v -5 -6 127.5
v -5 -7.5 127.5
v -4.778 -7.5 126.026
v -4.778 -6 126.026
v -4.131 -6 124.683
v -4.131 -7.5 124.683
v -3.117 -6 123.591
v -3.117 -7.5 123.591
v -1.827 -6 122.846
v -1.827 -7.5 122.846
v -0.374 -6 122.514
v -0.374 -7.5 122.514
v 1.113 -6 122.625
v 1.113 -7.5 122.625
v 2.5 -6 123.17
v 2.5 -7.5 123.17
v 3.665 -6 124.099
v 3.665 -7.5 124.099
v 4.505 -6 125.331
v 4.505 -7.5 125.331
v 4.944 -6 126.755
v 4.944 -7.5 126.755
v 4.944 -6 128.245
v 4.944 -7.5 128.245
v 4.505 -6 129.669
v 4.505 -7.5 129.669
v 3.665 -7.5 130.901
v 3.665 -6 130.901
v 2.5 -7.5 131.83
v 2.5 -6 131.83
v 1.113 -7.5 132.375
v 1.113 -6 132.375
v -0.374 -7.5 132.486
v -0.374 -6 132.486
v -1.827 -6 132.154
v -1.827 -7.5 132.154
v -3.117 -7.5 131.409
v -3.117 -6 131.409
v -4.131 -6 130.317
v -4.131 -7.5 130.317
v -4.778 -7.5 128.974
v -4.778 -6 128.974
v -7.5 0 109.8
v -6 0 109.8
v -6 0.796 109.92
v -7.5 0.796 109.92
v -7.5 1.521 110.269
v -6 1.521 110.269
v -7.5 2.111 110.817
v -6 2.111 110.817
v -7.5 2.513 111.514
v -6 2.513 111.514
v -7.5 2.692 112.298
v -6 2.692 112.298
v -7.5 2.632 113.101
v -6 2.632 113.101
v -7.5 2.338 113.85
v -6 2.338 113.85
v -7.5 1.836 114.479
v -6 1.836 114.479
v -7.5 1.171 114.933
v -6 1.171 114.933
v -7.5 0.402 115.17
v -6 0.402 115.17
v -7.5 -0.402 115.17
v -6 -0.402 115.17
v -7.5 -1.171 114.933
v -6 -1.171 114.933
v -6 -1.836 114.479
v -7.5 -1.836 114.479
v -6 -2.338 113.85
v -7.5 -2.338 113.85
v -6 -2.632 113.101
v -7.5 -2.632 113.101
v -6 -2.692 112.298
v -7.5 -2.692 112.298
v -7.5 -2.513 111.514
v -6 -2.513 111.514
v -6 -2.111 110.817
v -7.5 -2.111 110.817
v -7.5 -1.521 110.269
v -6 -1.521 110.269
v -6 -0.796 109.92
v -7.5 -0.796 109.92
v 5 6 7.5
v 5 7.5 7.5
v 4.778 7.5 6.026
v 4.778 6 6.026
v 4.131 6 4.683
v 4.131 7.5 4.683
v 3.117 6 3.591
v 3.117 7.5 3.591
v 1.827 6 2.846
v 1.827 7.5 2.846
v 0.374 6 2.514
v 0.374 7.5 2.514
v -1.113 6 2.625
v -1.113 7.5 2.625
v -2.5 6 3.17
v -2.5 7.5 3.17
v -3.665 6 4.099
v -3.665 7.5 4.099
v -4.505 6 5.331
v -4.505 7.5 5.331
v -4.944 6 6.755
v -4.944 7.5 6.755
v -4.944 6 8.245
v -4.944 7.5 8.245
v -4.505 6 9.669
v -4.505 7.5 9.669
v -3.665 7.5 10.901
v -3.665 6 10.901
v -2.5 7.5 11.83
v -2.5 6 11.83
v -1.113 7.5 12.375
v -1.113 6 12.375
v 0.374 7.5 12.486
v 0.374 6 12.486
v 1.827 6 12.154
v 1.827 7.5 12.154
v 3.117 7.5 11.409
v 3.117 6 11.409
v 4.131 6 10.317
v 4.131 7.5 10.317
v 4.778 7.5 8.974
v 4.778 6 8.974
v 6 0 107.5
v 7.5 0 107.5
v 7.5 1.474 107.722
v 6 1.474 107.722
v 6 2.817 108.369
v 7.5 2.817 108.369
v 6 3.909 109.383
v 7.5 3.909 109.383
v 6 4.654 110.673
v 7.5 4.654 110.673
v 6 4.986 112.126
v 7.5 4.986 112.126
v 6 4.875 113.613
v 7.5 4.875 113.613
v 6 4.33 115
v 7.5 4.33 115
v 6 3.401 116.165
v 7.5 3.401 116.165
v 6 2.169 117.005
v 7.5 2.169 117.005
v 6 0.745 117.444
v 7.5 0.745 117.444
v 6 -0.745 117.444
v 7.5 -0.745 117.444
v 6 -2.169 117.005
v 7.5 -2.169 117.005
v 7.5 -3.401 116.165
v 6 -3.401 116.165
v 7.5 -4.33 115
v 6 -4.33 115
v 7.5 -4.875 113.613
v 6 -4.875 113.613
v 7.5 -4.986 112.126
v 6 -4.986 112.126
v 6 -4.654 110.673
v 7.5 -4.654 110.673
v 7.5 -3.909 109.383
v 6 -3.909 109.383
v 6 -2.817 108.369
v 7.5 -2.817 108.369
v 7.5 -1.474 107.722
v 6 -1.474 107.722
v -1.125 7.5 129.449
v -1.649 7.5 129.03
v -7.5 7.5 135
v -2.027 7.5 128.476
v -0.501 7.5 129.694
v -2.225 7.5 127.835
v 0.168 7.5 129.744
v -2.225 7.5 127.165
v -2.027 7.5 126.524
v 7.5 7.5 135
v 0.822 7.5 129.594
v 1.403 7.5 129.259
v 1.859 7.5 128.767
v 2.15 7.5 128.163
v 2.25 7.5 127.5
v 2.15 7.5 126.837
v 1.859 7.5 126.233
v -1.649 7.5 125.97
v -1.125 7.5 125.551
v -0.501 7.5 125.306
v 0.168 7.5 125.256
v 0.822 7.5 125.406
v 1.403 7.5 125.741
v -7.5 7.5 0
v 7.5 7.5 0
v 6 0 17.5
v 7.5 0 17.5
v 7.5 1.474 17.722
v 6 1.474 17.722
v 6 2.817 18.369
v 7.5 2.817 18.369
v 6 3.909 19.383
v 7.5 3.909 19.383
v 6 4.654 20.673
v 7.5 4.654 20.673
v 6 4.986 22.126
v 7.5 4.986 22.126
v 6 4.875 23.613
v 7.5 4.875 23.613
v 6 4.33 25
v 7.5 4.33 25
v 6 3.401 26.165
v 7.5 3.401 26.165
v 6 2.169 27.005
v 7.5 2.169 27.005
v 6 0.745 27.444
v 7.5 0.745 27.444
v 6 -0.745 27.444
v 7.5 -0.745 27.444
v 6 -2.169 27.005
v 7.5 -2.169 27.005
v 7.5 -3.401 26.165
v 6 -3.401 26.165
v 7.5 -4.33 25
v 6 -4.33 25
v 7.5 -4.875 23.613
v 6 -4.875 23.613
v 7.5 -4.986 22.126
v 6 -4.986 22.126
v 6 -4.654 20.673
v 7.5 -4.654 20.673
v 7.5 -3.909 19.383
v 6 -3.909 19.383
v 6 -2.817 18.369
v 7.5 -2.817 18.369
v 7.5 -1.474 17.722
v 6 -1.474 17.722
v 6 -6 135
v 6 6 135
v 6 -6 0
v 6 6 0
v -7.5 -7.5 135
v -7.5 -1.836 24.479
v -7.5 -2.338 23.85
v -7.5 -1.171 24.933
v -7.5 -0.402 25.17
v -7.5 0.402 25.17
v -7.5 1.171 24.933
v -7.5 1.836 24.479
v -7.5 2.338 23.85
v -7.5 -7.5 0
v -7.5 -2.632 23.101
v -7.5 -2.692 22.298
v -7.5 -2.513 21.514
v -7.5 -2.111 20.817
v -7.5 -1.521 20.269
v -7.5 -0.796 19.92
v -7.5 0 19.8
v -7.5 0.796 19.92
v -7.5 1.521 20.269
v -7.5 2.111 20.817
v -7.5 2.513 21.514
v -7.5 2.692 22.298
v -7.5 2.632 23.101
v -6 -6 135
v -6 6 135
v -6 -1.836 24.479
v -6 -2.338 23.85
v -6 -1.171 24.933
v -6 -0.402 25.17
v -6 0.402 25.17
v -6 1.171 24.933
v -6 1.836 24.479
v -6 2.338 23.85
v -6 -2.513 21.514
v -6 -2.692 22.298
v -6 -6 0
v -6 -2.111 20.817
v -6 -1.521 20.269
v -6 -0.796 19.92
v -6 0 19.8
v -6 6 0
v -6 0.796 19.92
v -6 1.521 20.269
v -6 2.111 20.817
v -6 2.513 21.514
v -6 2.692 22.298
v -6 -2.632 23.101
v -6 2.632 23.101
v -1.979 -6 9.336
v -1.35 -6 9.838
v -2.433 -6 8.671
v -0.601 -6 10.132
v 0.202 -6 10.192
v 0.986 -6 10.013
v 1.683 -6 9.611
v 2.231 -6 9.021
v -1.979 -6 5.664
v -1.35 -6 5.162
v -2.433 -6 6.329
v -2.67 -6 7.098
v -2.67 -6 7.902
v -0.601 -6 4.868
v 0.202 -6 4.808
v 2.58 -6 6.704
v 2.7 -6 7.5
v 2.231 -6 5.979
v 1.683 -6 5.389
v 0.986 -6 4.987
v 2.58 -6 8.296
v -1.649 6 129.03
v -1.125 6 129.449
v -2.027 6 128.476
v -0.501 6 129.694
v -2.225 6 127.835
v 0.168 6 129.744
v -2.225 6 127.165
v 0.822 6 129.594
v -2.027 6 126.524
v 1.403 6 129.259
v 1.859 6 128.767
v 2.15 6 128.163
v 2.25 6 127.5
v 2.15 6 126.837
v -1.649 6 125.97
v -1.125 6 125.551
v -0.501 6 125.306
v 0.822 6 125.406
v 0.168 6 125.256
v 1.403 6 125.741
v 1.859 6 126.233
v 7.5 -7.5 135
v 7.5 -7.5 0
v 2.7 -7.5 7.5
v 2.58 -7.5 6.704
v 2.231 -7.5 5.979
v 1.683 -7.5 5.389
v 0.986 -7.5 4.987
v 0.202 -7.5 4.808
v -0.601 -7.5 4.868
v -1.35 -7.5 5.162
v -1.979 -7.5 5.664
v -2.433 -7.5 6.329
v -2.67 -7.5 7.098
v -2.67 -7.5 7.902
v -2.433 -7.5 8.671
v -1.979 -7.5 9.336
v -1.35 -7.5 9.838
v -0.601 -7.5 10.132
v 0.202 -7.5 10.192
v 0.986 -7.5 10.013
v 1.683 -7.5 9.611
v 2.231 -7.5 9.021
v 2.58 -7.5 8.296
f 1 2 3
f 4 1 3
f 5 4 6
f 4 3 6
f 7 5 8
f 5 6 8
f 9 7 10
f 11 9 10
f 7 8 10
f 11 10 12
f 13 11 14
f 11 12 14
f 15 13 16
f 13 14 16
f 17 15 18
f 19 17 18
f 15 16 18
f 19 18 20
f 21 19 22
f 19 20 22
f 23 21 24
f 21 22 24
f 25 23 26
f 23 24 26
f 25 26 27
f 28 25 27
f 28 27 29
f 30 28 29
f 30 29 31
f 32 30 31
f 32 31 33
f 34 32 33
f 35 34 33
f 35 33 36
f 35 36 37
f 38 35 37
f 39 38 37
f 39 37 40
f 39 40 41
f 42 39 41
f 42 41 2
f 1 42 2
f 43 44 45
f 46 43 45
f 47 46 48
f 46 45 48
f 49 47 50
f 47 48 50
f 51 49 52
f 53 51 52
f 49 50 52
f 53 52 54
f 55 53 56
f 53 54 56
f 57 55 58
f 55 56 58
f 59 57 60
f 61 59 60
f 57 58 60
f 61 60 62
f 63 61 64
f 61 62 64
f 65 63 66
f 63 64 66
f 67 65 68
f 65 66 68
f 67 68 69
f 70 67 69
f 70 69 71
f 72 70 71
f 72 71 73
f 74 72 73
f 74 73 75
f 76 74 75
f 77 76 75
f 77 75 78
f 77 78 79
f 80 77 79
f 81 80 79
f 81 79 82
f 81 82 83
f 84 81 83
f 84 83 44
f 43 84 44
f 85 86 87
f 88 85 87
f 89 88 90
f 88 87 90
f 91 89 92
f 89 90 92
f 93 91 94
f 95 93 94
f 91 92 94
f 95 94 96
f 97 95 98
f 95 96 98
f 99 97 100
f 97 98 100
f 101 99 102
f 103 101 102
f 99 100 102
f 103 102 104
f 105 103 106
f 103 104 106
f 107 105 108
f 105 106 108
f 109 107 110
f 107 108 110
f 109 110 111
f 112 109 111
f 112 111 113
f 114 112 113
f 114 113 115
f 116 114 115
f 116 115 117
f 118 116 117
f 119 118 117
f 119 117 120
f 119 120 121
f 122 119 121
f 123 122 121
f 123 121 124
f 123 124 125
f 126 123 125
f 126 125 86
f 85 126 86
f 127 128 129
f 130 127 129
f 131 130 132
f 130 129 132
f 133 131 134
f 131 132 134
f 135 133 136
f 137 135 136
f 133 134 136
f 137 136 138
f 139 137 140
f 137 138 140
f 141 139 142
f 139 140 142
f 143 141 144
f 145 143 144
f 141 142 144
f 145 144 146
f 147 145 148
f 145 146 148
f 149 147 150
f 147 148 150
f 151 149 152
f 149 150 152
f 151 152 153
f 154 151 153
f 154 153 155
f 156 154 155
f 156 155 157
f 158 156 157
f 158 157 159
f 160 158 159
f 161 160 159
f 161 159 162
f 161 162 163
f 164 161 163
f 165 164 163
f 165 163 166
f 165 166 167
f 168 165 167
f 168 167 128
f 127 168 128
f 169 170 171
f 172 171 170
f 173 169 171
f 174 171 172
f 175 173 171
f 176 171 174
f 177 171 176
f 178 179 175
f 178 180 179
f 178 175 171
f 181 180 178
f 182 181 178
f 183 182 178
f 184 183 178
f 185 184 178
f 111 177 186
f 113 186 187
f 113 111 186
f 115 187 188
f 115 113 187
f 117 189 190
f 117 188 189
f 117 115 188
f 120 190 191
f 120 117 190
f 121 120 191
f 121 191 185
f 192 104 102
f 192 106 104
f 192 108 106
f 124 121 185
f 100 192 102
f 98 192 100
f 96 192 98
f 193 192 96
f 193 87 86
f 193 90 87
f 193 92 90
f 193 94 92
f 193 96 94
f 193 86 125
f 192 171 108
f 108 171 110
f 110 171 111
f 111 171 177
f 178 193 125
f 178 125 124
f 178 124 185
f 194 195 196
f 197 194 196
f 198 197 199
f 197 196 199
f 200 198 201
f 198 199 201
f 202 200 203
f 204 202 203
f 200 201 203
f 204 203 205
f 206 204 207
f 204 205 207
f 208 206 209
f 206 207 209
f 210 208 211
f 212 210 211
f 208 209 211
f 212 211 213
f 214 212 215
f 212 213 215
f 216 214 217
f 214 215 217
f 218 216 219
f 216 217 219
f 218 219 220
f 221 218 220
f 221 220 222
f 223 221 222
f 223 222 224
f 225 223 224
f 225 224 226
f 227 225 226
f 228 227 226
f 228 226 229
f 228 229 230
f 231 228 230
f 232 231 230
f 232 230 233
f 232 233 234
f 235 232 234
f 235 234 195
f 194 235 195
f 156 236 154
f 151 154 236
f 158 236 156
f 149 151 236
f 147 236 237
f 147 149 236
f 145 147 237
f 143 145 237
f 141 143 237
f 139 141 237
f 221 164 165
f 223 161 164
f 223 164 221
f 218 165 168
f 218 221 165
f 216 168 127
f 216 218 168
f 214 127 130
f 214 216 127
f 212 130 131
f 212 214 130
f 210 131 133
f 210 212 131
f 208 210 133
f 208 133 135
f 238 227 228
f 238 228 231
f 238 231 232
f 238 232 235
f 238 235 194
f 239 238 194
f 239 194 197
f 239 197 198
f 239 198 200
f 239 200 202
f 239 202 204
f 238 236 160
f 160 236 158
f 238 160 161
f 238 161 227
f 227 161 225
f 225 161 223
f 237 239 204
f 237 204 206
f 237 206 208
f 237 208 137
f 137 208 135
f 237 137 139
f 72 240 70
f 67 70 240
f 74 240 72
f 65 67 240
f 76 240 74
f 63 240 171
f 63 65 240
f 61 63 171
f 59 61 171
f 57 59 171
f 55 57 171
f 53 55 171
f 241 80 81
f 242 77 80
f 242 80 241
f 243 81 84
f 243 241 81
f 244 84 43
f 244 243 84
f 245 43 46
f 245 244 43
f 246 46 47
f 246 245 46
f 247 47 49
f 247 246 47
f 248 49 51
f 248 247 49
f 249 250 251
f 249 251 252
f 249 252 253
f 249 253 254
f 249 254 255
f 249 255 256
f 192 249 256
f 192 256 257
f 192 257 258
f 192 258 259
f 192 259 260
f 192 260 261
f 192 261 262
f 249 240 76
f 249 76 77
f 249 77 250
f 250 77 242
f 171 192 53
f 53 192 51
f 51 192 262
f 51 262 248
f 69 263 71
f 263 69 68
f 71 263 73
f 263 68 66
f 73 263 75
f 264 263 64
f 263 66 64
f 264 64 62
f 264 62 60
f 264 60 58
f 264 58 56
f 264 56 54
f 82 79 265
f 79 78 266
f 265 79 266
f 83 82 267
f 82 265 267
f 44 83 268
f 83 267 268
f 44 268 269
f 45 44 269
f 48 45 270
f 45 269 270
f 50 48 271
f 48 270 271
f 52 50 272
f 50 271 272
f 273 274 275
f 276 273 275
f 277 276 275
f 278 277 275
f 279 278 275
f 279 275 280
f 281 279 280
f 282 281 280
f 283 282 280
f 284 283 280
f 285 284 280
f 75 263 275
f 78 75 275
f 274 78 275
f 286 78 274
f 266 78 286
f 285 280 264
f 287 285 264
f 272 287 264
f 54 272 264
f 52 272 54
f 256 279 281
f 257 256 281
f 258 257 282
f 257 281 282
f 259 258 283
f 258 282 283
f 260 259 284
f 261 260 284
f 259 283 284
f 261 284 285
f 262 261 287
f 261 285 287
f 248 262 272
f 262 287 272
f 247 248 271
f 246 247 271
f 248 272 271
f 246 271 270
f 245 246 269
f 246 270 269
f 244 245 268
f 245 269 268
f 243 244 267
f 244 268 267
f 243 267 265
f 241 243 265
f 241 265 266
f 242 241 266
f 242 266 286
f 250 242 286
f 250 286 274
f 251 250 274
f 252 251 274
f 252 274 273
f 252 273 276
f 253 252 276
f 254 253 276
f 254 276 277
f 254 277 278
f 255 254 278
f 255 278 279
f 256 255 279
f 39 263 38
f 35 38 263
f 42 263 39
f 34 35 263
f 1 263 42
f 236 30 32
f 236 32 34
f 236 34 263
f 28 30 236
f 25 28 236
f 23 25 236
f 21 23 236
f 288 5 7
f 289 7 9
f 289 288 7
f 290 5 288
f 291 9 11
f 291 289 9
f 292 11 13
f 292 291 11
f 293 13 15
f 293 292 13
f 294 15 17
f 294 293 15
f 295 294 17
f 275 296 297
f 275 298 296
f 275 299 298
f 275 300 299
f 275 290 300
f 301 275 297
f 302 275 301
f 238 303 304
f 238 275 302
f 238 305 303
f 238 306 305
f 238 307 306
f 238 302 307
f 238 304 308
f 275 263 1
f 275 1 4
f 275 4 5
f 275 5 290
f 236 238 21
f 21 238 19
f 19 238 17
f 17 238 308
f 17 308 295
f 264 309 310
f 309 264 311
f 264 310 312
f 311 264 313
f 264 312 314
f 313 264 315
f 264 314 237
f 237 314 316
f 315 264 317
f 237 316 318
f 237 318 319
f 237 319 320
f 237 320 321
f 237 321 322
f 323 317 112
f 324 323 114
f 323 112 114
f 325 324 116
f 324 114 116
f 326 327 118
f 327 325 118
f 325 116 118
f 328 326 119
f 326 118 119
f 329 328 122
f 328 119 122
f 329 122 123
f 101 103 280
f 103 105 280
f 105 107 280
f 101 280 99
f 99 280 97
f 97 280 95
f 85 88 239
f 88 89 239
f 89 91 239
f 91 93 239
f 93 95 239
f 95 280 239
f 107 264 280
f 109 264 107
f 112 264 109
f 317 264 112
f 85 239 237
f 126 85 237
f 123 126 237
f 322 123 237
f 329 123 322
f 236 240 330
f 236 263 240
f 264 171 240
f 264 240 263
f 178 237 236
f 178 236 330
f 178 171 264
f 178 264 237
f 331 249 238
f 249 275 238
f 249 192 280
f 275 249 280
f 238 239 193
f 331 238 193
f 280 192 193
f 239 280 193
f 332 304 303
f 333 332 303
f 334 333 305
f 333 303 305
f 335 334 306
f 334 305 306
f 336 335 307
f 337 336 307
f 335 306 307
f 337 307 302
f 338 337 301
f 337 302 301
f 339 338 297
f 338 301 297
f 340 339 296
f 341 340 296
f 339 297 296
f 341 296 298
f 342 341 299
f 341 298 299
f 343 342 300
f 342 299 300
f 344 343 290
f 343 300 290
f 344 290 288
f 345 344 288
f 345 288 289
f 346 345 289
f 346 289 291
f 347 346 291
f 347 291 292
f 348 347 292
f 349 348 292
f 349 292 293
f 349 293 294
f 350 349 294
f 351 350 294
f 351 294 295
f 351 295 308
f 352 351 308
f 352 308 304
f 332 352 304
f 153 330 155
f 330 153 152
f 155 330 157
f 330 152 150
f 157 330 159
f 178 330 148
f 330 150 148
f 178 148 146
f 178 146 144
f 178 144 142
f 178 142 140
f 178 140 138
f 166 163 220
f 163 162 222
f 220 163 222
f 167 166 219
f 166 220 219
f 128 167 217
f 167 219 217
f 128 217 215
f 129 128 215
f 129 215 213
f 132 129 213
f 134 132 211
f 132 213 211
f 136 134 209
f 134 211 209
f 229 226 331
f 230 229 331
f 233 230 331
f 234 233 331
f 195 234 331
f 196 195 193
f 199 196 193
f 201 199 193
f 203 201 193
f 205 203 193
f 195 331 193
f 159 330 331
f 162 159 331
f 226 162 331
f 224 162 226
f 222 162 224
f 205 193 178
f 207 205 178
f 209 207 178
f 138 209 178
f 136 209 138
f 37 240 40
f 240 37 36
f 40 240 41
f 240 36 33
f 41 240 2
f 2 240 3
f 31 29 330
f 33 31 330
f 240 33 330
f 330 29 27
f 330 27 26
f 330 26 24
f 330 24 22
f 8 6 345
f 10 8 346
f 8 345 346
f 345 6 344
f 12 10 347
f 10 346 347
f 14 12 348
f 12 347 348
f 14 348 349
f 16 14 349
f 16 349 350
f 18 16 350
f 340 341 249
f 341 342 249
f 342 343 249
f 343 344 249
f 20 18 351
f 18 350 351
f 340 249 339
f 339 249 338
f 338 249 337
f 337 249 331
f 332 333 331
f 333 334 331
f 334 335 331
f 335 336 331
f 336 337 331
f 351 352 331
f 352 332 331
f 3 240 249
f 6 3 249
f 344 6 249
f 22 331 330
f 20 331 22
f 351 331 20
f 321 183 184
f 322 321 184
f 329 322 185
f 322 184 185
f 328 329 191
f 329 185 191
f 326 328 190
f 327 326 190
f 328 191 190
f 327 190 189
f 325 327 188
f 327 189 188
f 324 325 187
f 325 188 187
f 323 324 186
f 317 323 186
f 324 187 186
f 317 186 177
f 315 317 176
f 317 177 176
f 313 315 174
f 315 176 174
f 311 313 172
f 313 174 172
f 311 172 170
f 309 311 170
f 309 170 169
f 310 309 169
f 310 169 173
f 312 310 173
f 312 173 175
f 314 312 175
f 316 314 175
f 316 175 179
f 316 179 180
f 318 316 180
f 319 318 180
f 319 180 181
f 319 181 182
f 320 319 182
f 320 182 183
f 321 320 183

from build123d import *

# Parameters (mm, degrees)
SKETCH_1_W          = 15
SKETCH_1_H          = 15
SKETCH_1_W_2        = 12
SKETCH_1_H_2        = 12
EXTRUDE_1_DEPTH     = 135
SKETCH_2_R          = 2.7
CUT_EXTRUDE_1_DEPTH = 25
SKETCH_3_R          = 2.7
SKETCH_3_R_2        = 2.25
CUT_EXTRUDE_2_DEPTH = 25
SKETCH_4_R          = 5
CUT_EXTRUDE_3_DEPTH = 10
SKETCH_5_R          = 5
CUT_EXTRUDE_4_DEPTH = 10
SKETCH_6_R          = 5
CUT_EXTRUDE_5_DEPTH = 10


with BuildPart() as part:
    # ｽｹｯﾁ1 → ﾎﾞｽ - 押し出し1 (new body)
    with BuildSketch(Plane.XY):
        Rectangle(SKETCH_1_W, SKETCH_1_H)
        Rectangle(SKETCH_1_W_2, SKETCH_1_H_2, mode=Mode.SUBTRACT)
    extrude(amount=EXTRUDE_1_DEPTH)

    # ｽｹｯﾁ2 → ｶｯﾄ - 押し出し1 (cut)
    with BuildSketch(Plane(origin=(7.5, 0, 0), x_dir=(0, 0, -1), z_dir=(1, 0, 0))):
        with Locations((-112.5, 0)):
            Circle(SKETCH_2_R)
        with Locations((-22.5, 0)):
            Circle(SKETCH_2_R)
    extrude(amount=-CUT_EXTRUDE_1_DEPTH, mode=Mode.SUBTRACT)

    # ｽｹｯﾁ3 → ｶｯﾄ - 押し出し2 (cut)
    with BuildSketch(Plane(origin=(0, 7.5, 0), x_dir=(1, 0, 0), z_dir=(0, 1, 0))):
        with Locations((0, -7.5)):
            Circle(SKETCH_3_R)
        with Locations((0, -127.5)):
            Circle(SKETCH_3_R_2)
    extrude(amount=-CUT_EXTRUDE_2_DEPTH, mode=Mode.SUBTRACT)

    # ｽｹｯﾁ4 → ｶｯﾄ - 押し出し3 (cut)
    with BuildSketch(Plane(origin=(0, 7.5, 0), x_dir=(1, 0, 0), z_dir=(0, 1, 0))):
        with Locations((0, -7.5)):
            Circle(SKETCH_4_R)
    extrude(amount=-CUT_EXTRUDE_3_DEPTH, mode=Mode.SUBTRACT)

    # ｽｹｯﾁ5 → ｶｯﾄ - 押し出し4 (cut)
    with BuildSketch(Plane(origin=(7.5, 0, 0), x_dir=(0, 0, -1), z_dir=(1, 0, 0))):
        with Locations((-22.5, 0)):
            Circle(SKETCH_5_R)
        with Locations((-112.5, 0)):
            Circle(SKETCH_5_R)
    extrude(amount=-CUT_EXTRUDE_4_DEPTH, mode=Mode.SUBTRACT)

    # ｽｹｯﾁ6 → ｶｯﾄ - 押し出し5 (cut)
    with BuildSketch(Plane(origin=(0, -7.5, 0), x_dir=(-1, 0, 0), z_dir=(0, -1, 0))):
        with Locations((0, -127.5)):
            Circle(SKETCH_6_R)
    extrude(amount=-CUT_EXTRUDE_5_DEPTH, mode=Mode.SUBTRACT)


solid = part.part
